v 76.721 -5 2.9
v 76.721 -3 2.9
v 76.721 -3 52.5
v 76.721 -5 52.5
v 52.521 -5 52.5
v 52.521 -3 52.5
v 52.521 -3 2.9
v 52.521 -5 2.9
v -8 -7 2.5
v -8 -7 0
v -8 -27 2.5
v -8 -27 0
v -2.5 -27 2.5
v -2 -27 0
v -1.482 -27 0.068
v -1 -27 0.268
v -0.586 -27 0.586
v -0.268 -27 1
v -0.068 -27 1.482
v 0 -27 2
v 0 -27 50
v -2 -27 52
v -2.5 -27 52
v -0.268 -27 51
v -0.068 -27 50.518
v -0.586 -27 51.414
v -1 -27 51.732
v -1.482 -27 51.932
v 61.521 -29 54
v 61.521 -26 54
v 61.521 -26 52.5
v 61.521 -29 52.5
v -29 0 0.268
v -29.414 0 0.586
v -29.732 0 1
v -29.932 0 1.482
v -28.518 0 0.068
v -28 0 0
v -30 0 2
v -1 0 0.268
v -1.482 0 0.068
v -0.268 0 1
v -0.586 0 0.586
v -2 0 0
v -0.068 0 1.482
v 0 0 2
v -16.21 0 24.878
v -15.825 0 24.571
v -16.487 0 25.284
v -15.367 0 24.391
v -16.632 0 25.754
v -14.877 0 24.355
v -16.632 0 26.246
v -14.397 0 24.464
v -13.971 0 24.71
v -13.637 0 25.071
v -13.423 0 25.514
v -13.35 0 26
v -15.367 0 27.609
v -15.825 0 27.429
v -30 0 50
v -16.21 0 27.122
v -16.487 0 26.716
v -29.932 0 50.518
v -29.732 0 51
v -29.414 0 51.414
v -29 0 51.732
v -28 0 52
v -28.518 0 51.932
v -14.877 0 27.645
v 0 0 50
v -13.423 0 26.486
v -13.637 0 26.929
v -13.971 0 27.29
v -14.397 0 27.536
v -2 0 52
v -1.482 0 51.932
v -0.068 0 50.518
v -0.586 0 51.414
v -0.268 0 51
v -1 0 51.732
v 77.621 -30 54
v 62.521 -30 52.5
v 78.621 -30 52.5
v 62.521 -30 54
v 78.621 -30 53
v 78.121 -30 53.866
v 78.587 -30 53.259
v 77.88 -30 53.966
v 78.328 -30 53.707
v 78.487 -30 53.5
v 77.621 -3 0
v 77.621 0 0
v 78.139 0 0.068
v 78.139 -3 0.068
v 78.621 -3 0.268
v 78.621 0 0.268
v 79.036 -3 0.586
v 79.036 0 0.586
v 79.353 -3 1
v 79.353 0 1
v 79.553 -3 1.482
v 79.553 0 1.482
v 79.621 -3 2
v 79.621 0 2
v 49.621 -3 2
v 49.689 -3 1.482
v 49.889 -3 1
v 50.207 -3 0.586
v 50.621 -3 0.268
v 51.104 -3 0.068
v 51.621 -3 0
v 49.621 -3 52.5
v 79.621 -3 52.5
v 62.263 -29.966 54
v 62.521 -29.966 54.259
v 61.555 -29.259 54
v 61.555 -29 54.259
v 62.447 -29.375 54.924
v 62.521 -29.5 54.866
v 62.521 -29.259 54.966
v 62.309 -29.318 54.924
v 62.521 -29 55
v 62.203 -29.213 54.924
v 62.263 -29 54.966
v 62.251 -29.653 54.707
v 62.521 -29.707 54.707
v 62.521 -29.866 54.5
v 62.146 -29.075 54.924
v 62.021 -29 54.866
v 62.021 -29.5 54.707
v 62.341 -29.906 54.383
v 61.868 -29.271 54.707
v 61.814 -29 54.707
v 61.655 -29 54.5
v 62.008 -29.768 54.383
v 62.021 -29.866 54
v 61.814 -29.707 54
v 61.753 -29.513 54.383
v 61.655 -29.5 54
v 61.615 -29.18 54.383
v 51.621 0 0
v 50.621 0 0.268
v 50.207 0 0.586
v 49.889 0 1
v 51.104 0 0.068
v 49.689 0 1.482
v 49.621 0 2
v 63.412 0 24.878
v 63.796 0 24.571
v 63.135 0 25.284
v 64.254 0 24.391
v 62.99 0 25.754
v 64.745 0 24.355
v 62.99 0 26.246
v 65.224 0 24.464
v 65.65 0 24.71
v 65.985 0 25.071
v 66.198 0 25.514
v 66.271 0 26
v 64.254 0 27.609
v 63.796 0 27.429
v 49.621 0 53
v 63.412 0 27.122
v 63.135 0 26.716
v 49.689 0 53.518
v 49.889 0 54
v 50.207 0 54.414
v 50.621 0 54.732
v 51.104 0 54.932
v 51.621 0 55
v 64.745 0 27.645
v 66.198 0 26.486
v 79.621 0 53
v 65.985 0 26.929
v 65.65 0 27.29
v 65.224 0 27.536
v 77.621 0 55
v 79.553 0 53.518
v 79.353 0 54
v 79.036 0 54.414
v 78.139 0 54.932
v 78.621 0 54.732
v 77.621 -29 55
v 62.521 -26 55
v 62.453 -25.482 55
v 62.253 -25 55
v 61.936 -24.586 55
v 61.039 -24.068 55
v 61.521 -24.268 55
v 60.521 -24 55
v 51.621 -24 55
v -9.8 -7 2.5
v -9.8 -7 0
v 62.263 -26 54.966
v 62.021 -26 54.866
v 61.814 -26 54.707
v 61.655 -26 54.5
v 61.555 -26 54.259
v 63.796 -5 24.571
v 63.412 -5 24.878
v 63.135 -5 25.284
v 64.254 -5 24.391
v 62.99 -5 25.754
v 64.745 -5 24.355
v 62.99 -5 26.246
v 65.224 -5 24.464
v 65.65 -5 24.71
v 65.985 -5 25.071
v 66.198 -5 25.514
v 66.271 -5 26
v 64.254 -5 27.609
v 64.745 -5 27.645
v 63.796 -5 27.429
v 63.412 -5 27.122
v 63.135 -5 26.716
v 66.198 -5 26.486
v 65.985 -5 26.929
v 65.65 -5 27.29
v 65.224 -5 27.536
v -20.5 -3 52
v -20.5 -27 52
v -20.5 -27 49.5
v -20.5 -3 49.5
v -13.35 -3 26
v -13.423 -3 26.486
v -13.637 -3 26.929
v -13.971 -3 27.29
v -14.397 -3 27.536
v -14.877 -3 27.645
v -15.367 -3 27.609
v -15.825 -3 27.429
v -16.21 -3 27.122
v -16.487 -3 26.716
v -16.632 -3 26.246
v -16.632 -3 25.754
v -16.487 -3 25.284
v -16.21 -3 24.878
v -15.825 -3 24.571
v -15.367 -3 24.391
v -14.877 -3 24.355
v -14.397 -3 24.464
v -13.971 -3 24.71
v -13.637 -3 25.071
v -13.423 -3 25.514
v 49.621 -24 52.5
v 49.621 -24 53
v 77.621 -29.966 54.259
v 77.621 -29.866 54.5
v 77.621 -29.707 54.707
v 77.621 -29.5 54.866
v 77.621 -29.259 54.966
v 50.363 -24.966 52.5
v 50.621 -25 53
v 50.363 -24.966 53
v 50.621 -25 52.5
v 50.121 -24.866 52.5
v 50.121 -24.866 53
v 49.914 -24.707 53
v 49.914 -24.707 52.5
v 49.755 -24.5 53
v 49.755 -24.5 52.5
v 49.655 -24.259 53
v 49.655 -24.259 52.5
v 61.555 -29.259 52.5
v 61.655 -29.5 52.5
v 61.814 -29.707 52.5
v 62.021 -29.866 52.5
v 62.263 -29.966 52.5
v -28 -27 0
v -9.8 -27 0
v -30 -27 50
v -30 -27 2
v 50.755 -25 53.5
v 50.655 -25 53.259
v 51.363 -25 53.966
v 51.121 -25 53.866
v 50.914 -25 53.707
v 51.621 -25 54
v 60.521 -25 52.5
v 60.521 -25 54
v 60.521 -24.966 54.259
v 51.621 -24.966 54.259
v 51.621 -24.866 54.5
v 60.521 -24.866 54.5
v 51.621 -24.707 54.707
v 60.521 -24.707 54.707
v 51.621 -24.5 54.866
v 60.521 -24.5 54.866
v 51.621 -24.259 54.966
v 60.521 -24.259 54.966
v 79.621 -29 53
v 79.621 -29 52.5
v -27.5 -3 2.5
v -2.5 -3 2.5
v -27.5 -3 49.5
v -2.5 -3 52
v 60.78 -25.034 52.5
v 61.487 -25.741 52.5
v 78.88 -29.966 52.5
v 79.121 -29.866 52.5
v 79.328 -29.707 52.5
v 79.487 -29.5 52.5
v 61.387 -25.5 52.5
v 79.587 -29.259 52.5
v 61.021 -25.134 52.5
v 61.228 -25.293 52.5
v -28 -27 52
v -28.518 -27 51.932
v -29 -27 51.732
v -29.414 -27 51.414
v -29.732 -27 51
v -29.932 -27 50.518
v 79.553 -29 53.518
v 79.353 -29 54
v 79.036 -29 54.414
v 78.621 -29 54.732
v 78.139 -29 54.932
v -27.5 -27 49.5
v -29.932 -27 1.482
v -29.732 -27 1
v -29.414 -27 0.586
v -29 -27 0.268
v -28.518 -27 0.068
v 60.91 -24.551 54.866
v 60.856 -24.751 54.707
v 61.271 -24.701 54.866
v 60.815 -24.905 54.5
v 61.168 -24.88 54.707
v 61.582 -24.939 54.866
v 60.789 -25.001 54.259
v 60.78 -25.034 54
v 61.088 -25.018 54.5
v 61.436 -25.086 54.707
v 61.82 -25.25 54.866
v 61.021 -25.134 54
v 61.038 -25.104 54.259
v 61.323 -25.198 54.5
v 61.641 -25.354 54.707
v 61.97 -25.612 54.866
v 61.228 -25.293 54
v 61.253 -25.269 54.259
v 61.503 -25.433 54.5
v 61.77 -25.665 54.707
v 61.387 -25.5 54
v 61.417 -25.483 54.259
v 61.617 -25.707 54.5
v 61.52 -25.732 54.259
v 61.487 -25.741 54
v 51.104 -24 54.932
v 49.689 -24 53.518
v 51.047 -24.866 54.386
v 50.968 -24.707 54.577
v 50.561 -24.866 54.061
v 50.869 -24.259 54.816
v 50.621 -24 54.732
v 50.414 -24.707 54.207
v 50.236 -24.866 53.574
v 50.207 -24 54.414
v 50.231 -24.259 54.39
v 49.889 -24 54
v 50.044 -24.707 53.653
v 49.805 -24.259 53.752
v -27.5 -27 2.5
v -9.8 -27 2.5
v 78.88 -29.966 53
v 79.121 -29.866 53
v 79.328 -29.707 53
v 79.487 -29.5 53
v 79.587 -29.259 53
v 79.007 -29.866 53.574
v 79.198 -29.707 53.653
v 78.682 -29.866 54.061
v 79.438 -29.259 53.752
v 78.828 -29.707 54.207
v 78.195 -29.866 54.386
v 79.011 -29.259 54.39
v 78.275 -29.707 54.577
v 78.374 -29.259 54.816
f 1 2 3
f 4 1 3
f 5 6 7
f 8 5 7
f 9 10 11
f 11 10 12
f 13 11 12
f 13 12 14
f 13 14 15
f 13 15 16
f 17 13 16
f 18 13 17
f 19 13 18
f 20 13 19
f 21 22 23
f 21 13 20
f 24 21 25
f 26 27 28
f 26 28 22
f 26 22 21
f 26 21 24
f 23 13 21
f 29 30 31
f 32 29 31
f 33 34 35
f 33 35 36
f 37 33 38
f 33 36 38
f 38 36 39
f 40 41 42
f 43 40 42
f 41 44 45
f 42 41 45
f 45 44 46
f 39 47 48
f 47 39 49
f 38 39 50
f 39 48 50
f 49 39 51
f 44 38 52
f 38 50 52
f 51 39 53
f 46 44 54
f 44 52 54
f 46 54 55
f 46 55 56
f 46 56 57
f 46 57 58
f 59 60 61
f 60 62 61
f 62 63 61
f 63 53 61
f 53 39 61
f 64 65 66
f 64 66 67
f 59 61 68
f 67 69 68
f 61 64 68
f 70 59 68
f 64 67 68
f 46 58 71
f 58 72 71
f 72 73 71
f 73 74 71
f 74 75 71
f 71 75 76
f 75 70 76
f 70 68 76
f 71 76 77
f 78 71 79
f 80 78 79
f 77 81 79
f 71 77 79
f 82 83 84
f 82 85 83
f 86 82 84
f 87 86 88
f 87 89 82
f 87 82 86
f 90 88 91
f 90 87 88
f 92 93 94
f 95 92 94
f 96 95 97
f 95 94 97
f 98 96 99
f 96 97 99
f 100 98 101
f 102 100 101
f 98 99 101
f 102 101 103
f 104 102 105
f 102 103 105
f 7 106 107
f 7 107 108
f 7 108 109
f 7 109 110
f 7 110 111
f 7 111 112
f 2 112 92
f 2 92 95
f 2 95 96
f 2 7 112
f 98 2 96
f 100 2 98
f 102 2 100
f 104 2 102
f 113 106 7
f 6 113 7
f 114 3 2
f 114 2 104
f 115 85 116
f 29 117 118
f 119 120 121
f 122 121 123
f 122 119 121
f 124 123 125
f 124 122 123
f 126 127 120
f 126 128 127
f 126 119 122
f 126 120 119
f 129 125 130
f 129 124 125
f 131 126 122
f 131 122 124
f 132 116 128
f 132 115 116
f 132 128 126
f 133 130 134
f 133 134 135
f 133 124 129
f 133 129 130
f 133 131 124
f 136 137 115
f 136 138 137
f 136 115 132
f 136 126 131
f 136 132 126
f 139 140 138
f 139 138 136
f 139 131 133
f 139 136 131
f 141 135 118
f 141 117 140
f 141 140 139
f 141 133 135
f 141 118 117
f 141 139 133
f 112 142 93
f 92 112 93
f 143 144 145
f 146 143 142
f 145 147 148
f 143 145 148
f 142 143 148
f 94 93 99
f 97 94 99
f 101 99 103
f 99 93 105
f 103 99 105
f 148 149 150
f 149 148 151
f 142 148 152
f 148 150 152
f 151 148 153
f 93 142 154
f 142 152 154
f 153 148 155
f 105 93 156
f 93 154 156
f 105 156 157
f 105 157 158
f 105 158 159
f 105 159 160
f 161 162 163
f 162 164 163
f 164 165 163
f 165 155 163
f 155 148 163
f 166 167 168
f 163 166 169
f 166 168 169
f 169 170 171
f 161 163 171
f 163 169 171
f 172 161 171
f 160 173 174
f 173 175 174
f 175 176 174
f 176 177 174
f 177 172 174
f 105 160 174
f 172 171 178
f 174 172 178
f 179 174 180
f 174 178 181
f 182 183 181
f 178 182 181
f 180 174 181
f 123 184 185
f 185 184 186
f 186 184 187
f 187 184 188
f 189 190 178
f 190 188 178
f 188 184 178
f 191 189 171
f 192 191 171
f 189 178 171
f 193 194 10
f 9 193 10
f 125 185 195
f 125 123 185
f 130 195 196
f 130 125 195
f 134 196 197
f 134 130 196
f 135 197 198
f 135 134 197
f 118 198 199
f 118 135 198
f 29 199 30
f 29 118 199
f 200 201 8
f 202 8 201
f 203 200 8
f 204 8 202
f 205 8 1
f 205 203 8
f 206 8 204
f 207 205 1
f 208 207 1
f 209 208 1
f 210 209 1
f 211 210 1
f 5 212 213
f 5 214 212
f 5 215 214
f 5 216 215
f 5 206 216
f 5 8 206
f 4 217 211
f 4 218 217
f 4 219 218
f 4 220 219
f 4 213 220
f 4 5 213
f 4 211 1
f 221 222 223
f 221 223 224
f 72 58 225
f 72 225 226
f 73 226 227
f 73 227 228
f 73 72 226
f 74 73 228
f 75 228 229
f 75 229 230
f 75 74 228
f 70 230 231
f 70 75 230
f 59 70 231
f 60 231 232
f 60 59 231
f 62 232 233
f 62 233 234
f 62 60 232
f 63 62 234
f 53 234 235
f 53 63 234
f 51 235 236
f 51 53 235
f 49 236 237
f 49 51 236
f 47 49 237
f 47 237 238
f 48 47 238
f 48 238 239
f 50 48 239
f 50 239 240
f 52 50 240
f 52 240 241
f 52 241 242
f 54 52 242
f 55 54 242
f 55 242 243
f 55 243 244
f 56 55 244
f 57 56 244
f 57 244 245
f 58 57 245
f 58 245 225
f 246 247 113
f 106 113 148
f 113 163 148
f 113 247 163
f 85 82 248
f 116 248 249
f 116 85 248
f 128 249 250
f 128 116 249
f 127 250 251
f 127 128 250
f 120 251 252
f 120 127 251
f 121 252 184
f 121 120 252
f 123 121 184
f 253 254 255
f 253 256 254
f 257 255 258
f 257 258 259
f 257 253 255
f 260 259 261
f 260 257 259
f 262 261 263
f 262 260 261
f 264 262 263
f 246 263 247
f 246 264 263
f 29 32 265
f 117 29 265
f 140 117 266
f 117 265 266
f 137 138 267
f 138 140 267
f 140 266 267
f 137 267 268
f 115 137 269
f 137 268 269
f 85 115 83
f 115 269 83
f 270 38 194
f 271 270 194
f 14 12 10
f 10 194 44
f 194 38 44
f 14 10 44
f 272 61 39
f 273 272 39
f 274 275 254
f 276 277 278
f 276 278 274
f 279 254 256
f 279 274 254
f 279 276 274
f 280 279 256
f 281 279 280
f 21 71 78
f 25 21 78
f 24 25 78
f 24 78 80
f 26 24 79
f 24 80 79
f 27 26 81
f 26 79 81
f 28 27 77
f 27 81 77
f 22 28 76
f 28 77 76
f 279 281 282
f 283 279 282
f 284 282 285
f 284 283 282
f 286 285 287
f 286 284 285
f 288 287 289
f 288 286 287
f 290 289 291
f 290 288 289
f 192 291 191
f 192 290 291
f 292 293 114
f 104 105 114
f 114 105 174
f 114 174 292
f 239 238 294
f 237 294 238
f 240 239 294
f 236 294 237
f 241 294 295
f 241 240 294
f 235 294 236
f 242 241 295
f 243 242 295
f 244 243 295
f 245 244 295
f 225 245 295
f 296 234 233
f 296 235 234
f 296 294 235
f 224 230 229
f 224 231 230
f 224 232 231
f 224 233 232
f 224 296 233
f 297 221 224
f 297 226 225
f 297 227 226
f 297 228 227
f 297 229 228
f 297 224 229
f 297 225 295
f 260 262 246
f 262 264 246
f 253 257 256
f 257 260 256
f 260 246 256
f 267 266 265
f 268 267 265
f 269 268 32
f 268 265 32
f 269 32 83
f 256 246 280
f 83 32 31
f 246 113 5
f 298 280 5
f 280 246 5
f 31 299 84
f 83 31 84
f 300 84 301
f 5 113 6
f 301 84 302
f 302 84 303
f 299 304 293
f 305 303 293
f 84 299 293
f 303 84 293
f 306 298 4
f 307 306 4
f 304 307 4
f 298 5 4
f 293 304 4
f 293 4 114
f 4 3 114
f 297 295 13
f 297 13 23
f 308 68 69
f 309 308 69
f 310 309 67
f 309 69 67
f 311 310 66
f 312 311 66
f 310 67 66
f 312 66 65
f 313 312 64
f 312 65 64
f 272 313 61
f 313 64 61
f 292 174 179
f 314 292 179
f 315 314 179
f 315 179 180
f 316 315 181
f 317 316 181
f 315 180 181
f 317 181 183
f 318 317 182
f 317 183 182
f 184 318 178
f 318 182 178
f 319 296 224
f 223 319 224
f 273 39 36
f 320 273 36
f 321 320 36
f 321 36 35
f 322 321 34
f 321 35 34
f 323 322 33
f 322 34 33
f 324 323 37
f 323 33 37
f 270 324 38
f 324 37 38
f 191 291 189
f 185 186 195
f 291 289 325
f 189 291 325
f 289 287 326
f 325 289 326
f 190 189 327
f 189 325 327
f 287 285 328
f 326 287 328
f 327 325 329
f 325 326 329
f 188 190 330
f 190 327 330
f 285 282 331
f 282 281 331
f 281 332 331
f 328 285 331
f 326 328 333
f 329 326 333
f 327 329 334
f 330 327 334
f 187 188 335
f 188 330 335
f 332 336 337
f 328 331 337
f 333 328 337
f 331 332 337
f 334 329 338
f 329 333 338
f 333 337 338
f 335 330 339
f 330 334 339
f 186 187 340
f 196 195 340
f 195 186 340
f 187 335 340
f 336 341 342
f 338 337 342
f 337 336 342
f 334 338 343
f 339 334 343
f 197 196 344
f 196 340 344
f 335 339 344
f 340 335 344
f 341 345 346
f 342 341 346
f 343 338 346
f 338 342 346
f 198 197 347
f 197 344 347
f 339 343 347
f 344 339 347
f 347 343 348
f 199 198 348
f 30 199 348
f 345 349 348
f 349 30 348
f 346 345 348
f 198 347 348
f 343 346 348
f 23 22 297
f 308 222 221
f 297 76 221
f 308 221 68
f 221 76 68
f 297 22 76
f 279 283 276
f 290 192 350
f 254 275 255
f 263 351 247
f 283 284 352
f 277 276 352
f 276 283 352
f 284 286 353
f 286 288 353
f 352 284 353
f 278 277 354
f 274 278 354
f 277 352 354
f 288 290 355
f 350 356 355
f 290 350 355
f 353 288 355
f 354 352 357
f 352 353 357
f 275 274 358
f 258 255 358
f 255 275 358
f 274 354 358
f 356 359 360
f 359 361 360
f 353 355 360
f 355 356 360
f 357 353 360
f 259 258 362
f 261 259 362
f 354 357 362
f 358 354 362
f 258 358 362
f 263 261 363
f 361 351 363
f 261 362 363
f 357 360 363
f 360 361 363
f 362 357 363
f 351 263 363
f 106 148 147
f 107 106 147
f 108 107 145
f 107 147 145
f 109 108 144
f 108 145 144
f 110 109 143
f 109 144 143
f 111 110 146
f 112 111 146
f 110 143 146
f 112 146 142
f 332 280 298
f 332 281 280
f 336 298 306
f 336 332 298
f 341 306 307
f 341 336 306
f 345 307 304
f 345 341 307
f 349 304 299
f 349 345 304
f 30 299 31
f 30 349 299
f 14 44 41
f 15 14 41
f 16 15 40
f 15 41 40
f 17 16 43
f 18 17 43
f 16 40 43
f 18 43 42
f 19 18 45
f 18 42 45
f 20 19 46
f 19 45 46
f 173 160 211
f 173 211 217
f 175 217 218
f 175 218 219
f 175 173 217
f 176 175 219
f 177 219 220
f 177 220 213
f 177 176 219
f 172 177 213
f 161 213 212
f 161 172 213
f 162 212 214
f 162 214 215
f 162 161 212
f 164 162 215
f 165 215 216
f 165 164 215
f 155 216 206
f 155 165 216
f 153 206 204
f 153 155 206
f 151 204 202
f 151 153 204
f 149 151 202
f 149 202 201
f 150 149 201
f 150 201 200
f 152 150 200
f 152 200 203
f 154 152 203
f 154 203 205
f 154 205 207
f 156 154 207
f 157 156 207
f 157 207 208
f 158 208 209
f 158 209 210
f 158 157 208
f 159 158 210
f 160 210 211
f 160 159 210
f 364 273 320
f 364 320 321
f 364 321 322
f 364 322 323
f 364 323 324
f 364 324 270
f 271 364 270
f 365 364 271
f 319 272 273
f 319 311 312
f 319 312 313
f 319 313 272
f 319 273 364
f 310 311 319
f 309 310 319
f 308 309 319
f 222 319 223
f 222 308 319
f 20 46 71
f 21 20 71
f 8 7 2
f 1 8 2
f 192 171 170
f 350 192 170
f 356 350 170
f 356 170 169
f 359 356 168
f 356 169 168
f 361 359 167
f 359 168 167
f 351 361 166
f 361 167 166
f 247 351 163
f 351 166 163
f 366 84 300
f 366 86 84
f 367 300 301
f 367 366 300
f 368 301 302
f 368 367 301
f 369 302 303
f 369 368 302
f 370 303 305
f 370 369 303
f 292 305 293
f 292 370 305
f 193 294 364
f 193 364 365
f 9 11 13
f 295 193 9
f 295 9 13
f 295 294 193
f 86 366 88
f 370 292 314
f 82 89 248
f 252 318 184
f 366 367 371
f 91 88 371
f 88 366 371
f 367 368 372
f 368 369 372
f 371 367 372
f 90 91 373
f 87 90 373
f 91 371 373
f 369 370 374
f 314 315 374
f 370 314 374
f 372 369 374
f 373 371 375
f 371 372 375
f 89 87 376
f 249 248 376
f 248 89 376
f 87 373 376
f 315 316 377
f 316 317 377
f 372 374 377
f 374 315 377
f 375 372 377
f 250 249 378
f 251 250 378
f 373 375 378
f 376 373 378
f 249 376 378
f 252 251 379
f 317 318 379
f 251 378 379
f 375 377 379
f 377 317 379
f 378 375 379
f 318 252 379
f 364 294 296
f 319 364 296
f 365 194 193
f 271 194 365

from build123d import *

# Parameters (mm, degrees)
F0_W      = 25
F0_H      = 47
F1_DEPTH  = 27
F0_R      = 1.65
F2_DEPTH  = 3
F3_W      = 1.8
F3_H      = 20
F4_DEPTH  = 25
F5_W      = 18
F5_H      = 24
F6_DEPTH  = 25
F8_DEPTH  = 3
F7_R      = 1.65
F9_DEPTH  = 5
F10_DEPTH = 30
F7_W      = 9
F7_H      = 2.5
F11_DEPTH = 25
F12_R     = 1


with BuildPart() as f1:
    # F0 (on Front) → F1 (new body)
    with BuildSketch(Plane.XZ):
        with BuildLine():
            Line((-28, 0), (-2, 0))
            ThreePointArc((-2, 0), (-0.5857864376, 0.5857864376), (0, 2))
            Line((0, 2), (0, 50))
            ThreePointArc((0, 50), (-0.5857864376, 51.4142135624), (-2, 52))
            Line((-2, 52), (-28, 52))
            ThreePointArc((-28, 52), (-29.4142135624, 51.4142135624), (-30, 50))
            Line((-30, 50), (-30, 2))
            ThreePointArc((-30, 2), (-29.4142135624, 0.5857864376), (-28, 0))
        make_face()
        with Locations((-15, 26)):
            Rectangle(F0_W, F0_H, mode=Mode.SUBTRACT)
    extrude(amount=F1_DEPTH)

    # F0 (on Front) → F2 (join)
    with BuildSketch(Plane.XZ):
        with Locations((-15, 26)):
            Rectangle(F0_W, F0_H)
        with Locations((-15, 26)):
            Circle(F0_R, mode=Mode.SUBTRACT)
    extrude(amount=F2_DEPTH)

    # F3 (on face) → F4 (cut)
    with BuildSketch(Plane(origin=(0, 0, 0), x_dir=(1, 0, 0), z_dir=(0, 0, -1))):
        with Locations((-8.9, 17)):
            Rectangle(F3_W, F3_H)
    extrude(amount=-F4_DEPTH, mode=Mode.SUBTRACT)

    # F5 (on face) → F6 (cut)
    with BuildSketch(Plane.XY.offset(52)):
        with Locations((-11.5, -15)):
            Rectangle(F5_W, F5_H)
    extrude(amount=-F6_DEPTH, mode=Mode.SUBTRACT)


with BuildPart() as f8:
    # F7 (on Front) → F8 (new body)
    with BuildSketch(Plane.XZ):
        with BuildLine():
            ThreePointArc((49.6213248736, 2), (50.2071113112, 0.5857864376), (51.6213248736, 0))
            Line((51.6213248736, 0), (77.6213248736, 0))
            ThreePointArc((77.6213248736, 0), (79.035538436, 0.5857864376), (79.6213248736, 2))
            Line((79.6213248736, 2), (79.6213248736, 50))
            Line((79.6213248736, 50), (79.6213248736, 52))
            Line((79.6213248736, 52), (79.6213248736, 52.5))
            Line((79.6213248736, 52.5), (76.7213248736, 52.5))
            Line((76.7213248736, 52.5), (76.7213248736, 49.1))
            Line((76.7213248736, 49.1), (76.7213248736, 2.9))
            Line((76.7213248736, 2.9), (52.5213248736, 2.9))
            Line((52.5213248736, 2.9), (52.5213248736, 49.1))
            Line((52.5213248736, 49.1), (52.5213248736, 52))
            Line((52.5213248736, 52), (52.5213248736, 52.5))
            Line((52.5213248736, 52.5), (49.6213248736, 52.5))
            Line((49.6213248736, 52.5), (49.6213248736, 52))
            Line((49.6213248736, 52), (49.6213248736, 50))
            Line((49.6213248736, 50), (49.6213248736, 2))
        make_face()
    extrude(amount=F8_DEPTH)

    # F7 (on Front) → F9 (join)
    with BuildSketch(Plane.XZ):
        Polygon((61.5213248736, 52.5), (52.5213248736, 52.5), (52.5213248736, 52), (52.5213248736, 49.1), (52.5213248736, 2.9), (76.7213248736, 2.9), (76.7213248736, 49.1), (76.7213248736, 52.5), align=None)
        with Locations((64.6213248736, 26)):
            Circle(F7_R, mode=Mode.SUBTRACT)
    extrude(amount=F9_DEPTH)

    # F7 (on Front) → F10 (join)
    with BuildSketch(Plane.XZ):
        with BuildLine():
            Line((76.7213248736, 52.5), (79.6213248736, 52.5))
            Line((79.6213248736, 52.5), (79.6213248736, 53))
            ThreePointArc((79.6213248736, 53), (79.035538436, 54.4142135624), (77.6213248736, 55))
            Line((77.6213248736, 55), (61.5213248736, 55))
            Line((61.5213248736, 55), (61.5213248736, 52.5))
            Line((61.5213248736, 52.5), (76.7213248736, 52.5))
        make_face()
    extrude(amount=F10_DEPTH)

    # F7 (on Front) → F11 (join)
    with BuildSketch(Plane.XZ):
        with Locations((57.0213248736, 53.75)):
            Rectangle(F7_W, F7_H)
        with BuildLine():
            Line((49.6213248736, 53), (49.6213248736, 52.5))
            Line((49.6213248736, 52.5), (52.5213248736, 52.5))
            Line((52.5213248736, 52.5), (52.5213248736, 55))
            Line((52.5213248736, 55), (51.6213248736, 55))
            ThreePointArc((51.6213248736, 55), (50.2071113112, 54.4142135624), (49.6213248736, 53))
        make_face()
    extrude(amount=F11_DEPTH)

    # F12
    f12_edges = [f8.edges().sort_by_distance(p)[0] for p in [
        (61.521325, -25, 53.75),
        (61.521325, -30, 53.75),
        (50.207111, -25, 54.414214),
        (79.035538, -30, 54.414214),
        (49.621325, -25, 52.75),
        (79.621325, -30, 52.75),
        (69.571325, -30, 55),
        (61.521325, -27.5, 55),
        (56.571325, -25, 55),
    ]]
    fillet(f12_edges, radius=F12_R)


solid = Compound([f1.part, f8.part])
